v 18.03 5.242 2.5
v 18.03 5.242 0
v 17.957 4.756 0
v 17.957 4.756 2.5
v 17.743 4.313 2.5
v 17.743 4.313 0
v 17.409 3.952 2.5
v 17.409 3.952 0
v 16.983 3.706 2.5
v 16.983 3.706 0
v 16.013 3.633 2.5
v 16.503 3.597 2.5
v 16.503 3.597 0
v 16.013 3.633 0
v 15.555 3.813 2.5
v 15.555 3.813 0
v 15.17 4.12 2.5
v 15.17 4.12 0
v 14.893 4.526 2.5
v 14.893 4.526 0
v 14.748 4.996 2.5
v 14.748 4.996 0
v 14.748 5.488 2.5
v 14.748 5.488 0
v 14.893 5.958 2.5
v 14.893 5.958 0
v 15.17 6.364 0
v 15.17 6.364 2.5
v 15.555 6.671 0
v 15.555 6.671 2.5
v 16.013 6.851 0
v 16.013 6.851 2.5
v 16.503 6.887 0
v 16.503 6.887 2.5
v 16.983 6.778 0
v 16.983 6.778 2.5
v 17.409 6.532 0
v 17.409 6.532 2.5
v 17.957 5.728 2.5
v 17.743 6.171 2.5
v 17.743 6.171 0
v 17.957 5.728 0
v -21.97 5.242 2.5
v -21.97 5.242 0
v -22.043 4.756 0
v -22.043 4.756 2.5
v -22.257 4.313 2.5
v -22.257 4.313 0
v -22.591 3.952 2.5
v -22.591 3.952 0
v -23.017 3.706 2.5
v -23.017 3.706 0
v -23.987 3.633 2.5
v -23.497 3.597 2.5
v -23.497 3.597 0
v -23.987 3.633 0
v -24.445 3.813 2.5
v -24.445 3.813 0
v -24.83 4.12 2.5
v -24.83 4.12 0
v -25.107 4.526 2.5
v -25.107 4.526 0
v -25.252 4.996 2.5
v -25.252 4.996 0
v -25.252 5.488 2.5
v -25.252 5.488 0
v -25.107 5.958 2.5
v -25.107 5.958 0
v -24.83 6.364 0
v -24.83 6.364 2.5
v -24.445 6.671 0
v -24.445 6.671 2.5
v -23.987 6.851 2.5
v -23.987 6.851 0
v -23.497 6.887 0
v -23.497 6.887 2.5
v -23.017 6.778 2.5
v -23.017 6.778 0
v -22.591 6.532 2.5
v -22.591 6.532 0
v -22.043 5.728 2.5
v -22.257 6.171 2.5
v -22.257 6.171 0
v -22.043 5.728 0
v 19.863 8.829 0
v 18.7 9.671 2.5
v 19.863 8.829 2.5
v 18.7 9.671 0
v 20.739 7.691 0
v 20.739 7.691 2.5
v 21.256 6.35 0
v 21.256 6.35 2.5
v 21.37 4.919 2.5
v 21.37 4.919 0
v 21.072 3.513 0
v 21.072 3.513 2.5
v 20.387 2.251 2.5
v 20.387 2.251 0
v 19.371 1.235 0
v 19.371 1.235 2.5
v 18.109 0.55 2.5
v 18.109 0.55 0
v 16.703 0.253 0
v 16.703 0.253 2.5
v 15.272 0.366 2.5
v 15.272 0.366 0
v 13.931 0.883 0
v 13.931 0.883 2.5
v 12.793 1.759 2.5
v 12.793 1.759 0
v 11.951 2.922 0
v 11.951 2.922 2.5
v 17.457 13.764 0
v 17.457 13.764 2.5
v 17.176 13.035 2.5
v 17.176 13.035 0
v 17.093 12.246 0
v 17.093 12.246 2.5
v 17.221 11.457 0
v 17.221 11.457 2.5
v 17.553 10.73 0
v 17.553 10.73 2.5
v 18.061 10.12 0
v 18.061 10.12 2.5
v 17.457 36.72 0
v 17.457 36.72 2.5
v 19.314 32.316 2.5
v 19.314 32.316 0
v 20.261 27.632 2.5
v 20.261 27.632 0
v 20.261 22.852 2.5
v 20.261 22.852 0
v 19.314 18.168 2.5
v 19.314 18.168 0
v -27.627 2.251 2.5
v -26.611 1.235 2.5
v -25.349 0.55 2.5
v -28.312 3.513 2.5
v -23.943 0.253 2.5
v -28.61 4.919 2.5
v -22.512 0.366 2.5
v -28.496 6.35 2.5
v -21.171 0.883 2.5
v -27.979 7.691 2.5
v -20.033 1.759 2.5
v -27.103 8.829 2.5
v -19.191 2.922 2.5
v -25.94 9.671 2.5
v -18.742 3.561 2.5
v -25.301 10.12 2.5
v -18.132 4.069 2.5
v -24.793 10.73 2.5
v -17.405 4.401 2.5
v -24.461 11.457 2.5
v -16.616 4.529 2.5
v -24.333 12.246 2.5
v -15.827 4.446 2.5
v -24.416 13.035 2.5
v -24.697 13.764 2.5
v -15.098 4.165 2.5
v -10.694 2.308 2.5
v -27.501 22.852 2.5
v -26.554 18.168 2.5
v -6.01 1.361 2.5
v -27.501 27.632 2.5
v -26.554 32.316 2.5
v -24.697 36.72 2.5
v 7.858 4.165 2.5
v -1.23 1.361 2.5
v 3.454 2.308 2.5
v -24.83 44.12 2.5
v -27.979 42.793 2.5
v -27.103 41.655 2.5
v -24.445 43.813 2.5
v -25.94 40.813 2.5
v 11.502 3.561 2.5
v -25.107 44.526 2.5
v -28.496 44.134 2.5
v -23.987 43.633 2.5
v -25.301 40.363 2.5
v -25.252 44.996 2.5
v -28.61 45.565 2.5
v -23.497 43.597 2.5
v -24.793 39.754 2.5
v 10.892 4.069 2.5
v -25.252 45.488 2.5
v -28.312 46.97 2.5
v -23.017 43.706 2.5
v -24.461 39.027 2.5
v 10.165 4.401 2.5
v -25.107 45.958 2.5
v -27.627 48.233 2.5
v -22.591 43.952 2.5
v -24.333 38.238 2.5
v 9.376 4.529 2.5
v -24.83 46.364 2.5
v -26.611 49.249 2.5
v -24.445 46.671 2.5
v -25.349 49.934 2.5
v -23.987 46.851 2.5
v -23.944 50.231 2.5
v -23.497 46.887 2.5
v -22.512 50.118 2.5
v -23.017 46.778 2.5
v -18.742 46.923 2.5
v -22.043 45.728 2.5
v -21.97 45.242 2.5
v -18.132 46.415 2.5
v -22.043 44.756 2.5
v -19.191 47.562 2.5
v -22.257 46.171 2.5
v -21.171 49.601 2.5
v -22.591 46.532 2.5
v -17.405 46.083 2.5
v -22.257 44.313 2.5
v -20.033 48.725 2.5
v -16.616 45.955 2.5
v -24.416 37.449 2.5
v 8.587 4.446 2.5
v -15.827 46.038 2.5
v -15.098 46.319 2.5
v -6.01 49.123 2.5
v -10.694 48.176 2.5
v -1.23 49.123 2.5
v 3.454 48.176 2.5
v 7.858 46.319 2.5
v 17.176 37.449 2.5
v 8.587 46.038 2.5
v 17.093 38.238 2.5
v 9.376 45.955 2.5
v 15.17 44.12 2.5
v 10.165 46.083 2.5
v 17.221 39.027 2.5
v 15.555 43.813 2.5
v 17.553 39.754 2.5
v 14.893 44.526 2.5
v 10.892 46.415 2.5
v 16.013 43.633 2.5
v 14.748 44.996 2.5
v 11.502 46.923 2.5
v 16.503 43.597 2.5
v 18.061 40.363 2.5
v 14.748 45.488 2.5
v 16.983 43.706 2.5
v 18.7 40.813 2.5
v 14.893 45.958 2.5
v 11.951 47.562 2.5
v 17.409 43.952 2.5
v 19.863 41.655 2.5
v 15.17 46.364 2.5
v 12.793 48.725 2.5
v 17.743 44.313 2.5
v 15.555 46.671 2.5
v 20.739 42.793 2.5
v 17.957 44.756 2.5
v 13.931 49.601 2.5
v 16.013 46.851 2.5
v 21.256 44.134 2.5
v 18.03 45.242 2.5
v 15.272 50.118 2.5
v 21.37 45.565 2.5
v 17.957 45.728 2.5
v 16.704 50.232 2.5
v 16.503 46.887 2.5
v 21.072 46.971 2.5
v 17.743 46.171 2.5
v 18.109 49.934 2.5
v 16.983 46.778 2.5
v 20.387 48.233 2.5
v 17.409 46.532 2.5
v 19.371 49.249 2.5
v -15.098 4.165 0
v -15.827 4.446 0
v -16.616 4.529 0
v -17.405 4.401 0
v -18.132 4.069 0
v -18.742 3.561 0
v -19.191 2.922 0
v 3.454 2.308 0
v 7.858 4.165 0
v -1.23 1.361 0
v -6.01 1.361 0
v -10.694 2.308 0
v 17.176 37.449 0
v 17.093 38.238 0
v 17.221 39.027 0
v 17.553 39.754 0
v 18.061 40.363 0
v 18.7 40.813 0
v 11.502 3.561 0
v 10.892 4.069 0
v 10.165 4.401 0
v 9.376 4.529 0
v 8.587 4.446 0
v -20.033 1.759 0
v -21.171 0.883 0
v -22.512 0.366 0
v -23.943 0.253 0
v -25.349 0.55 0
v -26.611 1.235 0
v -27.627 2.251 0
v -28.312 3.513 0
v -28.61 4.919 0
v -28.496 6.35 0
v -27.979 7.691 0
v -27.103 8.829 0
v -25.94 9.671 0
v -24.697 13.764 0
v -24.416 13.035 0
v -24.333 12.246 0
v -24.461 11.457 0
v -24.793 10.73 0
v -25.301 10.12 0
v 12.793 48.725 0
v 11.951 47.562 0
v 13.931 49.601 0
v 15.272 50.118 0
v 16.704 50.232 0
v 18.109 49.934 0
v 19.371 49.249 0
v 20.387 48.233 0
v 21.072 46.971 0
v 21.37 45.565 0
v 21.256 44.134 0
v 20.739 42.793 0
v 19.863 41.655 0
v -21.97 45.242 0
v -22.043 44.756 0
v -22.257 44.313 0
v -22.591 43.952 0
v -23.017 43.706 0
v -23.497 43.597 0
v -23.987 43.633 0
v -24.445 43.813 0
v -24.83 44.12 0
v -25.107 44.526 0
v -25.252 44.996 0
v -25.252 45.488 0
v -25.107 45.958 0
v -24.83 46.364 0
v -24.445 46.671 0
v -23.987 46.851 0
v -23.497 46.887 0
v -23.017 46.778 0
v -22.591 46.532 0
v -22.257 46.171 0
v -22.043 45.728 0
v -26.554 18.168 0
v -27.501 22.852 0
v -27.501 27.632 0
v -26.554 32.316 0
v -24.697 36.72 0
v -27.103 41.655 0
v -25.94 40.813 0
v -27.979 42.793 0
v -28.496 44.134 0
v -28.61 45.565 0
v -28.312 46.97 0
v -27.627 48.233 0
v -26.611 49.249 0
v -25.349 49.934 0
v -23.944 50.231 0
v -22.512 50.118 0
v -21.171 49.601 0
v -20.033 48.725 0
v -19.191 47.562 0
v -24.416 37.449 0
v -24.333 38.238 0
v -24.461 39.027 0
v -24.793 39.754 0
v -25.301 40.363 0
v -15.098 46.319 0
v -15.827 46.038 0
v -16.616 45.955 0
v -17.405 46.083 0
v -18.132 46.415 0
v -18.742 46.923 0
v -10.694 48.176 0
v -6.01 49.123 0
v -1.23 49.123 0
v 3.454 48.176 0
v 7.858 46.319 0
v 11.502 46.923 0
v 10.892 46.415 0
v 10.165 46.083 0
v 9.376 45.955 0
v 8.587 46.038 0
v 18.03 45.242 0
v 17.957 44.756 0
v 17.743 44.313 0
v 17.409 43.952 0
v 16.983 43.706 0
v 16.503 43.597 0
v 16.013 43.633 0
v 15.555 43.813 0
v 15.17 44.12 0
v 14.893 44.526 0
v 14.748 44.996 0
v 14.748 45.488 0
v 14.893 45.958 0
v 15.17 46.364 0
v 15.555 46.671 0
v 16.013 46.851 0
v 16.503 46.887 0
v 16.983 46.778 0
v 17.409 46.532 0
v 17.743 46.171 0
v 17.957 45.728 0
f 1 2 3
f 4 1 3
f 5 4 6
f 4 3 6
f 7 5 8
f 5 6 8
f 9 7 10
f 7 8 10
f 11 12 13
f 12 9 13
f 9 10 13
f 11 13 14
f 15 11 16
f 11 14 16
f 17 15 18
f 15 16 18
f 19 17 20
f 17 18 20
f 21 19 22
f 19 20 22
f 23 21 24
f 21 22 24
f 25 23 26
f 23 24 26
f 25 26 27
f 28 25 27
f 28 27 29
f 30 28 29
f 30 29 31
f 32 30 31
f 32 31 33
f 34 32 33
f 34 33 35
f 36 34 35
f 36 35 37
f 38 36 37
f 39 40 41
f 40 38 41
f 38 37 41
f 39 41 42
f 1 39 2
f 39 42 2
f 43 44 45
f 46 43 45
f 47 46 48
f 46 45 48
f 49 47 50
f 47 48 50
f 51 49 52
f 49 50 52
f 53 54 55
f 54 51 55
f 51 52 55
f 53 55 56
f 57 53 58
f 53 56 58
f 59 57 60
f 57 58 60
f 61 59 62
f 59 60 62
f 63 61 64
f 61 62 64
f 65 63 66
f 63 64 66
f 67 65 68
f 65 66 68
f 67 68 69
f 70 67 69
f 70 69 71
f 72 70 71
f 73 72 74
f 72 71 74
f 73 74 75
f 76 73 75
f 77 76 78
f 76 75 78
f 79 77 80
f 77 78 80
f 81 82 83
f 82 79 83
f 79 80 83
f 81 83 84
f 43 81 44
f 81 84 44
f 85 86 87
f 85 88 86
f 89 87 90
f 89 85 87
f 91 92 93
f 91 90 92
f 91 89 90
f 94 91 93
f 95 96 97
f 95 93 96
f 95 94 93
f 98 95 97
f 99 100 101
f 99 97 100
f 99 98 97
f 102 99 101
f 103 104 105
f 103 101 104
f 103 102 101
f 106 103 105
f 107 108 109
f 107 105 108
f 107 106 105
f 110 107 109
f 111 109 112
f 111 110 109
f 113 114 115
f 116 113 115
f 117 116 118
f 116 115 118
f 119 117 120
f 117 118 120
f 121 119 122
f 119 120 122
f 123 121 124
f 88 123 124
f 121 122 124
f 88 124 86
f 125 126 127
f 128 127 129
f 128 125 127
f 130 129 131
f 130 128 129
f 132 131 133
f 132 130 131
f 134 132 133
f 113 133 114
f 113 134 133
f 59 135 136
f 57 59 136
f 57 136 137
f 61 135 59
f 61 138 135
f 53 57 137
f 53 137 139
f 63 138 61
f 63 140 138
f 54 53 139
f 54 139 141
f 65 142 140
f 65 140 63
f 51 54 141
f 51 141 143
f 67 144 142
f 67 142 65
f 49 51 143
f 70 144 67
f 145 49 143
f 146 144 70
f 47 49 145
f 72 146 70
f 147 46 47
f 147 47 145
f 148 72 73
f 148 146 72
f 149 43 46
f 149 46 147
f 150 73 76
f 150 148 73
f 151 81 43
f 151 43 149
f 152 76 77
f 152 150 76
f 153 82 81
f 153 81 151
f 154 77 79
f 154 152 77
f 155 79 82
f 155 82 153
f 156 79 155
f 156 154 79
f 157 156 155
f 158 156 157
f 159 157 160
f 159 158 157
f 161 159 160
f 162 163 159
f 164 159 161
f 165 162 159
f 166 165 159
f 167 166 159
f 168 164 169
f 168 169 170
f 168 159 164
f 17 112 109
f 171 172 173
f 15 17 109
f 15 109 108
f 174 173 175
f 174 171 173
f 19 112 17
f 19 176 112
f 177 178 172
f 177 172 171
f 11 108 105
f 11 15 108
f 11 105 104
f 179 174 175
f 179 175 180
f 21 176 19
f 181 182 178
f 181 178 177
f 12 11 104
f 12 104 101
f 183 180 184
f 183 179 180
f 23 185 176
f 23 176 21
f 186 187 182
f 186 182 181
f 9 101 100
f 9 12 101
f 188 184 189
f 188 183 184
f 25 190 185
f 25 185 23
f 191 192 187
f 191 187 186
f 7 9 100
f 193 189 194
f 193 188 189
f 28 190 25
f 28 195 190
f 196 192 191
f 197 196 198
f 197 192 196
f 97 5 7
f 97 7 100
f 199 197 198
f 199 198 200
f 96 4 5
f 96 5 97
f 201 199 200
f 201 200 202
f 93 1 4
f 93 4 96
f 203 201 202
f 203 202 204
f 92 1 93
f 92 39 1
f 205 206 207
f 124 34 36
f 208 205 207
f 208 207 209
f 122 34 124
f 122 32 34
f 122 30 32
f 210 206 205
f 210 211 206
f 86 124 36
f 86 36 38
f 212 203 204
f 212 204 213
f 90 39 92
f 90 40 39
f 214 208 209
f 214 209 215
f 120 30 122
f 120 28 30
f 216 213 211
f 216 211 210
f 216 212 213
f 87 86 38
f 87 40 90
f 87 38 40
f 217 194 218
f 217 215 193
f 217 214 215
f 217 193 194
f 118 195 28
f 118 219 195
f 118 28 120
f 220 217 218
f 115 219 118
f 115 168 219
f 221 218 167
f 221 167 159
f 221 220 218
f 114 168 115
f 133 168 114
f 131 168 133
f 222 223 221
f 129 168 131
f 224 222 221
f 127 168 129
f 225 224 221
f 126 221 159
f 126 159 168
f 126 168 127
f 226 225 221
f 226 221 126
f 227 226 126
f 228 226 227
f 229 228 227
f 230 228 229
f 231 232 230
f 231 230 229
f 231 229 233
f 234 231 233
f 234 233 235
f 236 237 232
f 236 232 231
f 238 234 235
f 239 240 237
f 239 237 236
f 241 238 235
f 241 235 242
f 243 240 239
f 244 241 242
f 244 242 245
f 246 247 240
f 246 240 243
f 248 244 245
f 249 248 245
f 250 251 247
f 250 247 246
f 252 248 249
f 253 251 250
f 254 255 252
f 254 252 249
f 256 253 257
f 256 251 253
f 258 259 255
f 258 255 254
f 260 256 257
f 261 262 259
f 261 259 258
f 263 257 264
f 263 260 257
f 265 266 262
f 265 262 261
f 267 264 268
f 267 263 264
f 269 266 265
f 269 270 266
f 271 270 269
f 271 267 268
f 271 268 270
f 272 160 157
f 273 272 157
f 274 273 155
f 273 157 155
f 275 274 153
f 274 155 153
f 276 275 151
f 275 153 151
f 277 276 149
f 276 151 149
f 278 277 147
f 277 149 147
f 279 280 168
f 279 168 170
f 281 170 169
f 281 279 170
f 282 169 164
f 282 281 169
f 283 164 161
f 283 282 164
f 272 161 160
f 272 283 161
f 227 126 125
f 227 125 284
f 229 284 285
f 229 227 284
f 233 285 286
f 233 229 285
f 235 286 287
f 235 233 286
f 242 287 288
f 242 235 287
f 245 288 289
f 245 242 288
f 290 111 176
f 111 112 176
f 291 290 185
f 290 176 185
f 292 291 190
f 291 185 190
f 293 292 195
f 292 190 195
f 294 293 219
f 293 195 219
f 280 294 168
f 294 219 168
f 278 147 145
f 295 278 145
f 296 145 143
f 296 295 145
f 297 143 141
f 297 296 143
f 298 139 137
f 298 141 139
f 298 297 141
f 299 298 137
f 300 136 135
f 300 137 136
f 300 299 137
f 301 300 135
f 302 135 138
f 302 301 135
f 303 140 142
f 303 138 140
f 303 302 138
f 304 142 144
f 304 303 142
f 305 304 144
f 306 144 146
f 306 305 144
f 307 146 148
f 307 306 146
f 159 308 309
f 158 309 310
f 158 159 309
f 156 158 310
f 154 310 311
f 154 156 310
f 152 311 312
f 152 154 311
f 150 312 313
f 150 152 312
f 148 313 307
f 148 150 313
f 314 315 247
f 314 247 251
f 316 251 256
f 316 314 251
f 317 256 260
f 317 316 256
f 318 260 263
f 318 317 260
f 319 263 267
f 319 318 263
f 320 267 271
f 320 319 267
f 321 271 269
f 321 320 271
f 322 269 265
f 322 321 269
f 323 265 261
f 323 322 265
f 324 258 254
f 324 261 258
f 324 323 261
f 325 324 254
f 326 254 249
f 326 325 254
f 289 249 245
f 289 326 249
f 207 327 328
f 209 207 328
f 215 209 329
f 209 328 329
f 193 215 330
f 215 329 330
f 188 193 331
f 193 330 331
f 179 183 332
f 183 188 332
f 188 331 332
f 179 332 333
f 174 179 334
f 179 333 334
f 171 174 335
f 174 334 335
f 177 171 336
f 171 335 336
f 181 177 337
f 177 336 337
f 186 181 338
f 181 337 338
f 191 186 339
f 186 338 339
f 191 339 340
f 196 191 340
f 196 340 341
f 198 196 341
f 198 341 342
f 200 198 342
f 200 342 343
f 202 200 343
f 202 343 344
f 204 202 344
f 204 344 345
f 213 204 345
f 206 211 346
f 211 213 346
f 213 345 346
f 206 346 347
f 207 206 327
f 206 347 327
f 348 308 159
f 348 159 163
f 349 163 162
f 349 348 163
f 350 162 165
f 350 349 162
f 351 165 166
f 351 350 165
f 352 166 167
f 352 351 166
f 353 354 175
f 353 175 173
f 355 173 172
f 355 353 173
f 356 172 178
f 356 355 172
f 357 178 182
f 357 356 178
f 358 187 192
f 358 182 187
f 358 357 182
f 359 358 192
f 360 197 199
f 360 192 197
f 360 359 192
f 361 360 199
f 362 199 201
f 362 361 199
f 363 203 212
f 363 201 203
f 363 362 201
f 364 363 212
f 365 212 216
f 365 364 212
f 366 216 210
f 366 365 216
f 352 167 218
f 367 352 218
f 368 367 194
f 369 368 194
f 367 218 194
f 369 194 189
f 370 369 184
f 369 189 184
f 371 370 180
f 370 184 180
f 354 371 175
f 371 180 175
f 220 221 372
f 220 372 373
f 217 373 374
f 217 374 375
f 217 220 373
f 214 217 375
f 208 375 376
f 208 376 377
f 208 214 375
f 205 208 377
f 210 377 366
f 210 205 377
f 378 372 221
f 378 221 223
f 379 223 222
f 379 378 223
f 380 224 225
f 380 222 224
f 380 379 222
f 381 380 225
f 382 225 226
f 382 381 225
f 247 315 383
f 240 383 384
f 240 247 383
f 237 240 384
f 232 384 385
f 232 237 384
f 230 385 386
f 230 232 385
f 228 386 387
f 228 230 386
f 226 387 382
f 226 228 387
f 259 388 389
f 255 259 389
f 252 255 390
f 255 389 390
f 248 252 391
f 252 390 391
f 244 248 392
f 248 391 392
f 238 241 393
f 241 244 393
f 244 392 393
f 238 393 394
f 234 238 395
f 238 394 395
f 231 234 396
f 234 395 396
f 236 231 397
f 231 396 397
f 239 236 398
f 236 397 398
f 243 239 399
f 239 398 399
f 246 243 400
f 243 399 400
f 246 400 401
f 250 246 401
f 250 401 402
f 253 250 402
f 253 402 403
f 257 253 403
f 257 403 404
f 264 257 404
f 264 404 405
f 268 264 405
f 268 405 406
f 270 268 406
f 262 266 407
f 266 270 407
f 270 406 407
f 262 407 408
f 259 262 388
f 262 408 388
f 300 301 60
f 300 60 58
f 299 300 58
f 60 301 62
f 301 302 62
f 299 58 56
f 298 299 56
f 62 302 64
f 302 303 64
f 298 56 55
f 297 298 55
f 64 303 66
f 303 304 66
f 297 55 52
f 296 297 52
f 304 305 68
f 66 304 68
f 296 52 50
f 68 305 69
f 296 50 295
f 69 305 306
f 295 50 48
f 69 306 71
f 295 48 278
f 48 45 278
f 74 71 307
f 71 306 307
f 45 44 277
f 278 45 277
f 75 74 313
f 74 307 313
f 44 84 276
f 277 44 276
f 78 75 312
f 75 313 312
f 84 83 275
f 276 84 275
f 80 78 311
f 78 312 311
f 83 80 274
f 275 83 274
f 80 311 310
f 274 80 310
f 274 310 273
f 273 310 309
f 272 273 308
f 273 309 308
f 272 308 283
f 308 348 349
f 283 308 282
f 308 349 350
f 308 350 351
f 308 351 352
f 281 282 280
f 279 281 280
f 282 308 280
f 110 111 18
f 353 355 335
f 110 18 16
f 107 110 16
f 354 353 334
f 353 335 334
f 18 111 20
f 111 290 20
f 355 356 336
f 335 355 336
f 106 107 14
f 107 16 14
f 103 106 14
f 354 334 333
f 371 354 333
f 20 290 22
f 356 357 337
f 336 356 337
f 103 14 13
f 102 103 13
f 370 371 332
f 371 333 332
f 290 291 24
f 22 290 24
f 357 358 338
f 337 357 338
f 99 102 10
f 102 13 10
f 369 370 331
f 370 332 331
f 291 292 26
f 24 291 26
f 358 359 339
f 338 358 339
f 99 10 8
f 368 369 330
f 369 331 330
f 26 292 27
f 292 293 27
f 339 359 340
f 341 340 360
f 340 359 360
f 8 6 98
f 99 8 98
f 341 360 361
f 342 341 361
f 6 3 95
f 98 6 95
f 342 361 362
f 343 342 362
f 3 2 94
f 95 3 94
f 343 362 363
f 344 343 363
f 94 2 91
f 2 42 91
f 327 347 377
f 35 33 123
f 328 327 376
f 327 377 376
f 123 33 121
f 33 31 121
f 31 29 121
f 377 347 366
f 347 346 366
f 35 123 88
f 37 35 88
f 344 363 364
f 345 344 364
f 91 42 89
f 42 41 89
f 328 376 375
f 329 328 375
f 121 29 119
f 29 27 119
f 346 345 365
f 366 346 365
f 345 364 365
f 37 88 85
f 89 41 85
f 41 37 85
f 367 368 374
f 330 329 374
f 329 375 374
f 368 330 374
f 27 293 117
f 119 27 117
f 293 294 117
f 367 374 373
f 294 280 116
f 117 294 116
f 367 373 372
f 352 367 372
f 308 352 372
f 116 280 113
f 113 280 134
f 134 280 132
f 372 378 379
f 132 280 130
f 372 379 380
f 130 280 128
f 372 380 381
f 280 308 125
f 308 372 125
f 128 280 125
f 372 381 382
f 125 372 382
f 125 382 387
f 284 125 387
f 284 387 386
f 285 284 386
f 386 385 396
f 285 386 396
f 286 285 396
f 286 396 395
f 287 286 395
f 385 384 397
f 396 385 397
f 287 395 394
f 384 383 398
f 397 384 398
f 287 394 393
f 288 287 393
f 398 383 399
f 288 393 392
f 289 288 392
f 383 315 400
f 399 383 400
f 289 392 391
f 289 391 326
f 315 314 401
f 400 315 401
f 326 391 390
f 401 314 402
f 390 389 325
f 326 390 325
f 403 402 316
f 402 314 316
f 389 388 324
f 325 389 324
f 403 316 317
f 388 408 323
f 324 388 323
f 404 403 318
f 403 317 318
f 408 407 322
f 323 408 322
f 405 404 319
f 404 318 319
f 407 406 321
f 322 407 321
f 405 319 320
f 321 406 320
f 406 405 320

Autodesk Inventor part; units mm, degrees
ref_plane "YZ Plane" through (0, 0, 0) normal (1, 0, 0) x (0, 1, 0)
ref_plane "XZ Plane" through (0, 0, 0) normal (0, 1, 0) x (-1, 0, 0)
ref_plane "XY Plane" through (0, 0, 0) normal (0, 0, 1) x (1, 0, 0)
sketch "Szkic1" plane through (0, 0, 0) normal (0, 0, 1) x (1, 0, 0)
  circle A0 centre (-23.62, 45.242) radius 1.65
  circle A1 centre (16.38, 45.242) radius 1.65
  circle A2 centre (-23.62, 5.242) radius 1.65
  circle A3 centre (16.38, 5.242) radius 1.65
  circle A4 centre (-3.62, 25.242) radius 24
  arc A5 (-18.8305, 43.8065) -> (-22.1845, 40.4524) centre (-23.62, 45.242) ccw
  arc A6 (-22.1845, 10.0315) -> (-18.8305, 6.6774) centre (-23.62, 5.242) ccw
  arc A7 (14.9445, 40.4524) -> (11.5905, 43.8065) centre (16.38, 45.242) ccw
  arc A8 (11.5905, 6.6774) -> (14.9445, 10.0315) centre (16.38, 5.242) ccw
  point P0 (0, 0)
  point P1 (0, 0)
  dimension "d10" = 3.3
  dimension "d11" = 3.3
  dimension "d12" = 3.3
  dimension "d15" = 10
  dimension "d16" = 10
  dimension "d17" = 10
  dimension "d18" = 10
  dimension "d22" = 3.3
extrude "Wyciągnięcie proste1" add sketch "Szkic1" along normal blind 2.5
fillet "Zaokrąglenie1" radius 3 8 edges at (-22.1845, 10.0315, 1.25) (-18.8305, 6.6774, 1.25) (14.9445, 10.0315, 1.25) (11.5905, 6.6774, 1.25) (11.5905, 43.8065, 1.25) (14.9445, 40.4524, 1.25) (-18.8305, 43.8065, 1.25) (-22.1845, 40.4524, 1.25)
equation "\"d10\" = d12"
equation "\"d11\" = d12"
equation "\"d22\" = d12"
properties part number "3DP_ABS_Electronics_Colling_Fan_Grill_Honeycomb" material "Aluminium 5005-H12"
